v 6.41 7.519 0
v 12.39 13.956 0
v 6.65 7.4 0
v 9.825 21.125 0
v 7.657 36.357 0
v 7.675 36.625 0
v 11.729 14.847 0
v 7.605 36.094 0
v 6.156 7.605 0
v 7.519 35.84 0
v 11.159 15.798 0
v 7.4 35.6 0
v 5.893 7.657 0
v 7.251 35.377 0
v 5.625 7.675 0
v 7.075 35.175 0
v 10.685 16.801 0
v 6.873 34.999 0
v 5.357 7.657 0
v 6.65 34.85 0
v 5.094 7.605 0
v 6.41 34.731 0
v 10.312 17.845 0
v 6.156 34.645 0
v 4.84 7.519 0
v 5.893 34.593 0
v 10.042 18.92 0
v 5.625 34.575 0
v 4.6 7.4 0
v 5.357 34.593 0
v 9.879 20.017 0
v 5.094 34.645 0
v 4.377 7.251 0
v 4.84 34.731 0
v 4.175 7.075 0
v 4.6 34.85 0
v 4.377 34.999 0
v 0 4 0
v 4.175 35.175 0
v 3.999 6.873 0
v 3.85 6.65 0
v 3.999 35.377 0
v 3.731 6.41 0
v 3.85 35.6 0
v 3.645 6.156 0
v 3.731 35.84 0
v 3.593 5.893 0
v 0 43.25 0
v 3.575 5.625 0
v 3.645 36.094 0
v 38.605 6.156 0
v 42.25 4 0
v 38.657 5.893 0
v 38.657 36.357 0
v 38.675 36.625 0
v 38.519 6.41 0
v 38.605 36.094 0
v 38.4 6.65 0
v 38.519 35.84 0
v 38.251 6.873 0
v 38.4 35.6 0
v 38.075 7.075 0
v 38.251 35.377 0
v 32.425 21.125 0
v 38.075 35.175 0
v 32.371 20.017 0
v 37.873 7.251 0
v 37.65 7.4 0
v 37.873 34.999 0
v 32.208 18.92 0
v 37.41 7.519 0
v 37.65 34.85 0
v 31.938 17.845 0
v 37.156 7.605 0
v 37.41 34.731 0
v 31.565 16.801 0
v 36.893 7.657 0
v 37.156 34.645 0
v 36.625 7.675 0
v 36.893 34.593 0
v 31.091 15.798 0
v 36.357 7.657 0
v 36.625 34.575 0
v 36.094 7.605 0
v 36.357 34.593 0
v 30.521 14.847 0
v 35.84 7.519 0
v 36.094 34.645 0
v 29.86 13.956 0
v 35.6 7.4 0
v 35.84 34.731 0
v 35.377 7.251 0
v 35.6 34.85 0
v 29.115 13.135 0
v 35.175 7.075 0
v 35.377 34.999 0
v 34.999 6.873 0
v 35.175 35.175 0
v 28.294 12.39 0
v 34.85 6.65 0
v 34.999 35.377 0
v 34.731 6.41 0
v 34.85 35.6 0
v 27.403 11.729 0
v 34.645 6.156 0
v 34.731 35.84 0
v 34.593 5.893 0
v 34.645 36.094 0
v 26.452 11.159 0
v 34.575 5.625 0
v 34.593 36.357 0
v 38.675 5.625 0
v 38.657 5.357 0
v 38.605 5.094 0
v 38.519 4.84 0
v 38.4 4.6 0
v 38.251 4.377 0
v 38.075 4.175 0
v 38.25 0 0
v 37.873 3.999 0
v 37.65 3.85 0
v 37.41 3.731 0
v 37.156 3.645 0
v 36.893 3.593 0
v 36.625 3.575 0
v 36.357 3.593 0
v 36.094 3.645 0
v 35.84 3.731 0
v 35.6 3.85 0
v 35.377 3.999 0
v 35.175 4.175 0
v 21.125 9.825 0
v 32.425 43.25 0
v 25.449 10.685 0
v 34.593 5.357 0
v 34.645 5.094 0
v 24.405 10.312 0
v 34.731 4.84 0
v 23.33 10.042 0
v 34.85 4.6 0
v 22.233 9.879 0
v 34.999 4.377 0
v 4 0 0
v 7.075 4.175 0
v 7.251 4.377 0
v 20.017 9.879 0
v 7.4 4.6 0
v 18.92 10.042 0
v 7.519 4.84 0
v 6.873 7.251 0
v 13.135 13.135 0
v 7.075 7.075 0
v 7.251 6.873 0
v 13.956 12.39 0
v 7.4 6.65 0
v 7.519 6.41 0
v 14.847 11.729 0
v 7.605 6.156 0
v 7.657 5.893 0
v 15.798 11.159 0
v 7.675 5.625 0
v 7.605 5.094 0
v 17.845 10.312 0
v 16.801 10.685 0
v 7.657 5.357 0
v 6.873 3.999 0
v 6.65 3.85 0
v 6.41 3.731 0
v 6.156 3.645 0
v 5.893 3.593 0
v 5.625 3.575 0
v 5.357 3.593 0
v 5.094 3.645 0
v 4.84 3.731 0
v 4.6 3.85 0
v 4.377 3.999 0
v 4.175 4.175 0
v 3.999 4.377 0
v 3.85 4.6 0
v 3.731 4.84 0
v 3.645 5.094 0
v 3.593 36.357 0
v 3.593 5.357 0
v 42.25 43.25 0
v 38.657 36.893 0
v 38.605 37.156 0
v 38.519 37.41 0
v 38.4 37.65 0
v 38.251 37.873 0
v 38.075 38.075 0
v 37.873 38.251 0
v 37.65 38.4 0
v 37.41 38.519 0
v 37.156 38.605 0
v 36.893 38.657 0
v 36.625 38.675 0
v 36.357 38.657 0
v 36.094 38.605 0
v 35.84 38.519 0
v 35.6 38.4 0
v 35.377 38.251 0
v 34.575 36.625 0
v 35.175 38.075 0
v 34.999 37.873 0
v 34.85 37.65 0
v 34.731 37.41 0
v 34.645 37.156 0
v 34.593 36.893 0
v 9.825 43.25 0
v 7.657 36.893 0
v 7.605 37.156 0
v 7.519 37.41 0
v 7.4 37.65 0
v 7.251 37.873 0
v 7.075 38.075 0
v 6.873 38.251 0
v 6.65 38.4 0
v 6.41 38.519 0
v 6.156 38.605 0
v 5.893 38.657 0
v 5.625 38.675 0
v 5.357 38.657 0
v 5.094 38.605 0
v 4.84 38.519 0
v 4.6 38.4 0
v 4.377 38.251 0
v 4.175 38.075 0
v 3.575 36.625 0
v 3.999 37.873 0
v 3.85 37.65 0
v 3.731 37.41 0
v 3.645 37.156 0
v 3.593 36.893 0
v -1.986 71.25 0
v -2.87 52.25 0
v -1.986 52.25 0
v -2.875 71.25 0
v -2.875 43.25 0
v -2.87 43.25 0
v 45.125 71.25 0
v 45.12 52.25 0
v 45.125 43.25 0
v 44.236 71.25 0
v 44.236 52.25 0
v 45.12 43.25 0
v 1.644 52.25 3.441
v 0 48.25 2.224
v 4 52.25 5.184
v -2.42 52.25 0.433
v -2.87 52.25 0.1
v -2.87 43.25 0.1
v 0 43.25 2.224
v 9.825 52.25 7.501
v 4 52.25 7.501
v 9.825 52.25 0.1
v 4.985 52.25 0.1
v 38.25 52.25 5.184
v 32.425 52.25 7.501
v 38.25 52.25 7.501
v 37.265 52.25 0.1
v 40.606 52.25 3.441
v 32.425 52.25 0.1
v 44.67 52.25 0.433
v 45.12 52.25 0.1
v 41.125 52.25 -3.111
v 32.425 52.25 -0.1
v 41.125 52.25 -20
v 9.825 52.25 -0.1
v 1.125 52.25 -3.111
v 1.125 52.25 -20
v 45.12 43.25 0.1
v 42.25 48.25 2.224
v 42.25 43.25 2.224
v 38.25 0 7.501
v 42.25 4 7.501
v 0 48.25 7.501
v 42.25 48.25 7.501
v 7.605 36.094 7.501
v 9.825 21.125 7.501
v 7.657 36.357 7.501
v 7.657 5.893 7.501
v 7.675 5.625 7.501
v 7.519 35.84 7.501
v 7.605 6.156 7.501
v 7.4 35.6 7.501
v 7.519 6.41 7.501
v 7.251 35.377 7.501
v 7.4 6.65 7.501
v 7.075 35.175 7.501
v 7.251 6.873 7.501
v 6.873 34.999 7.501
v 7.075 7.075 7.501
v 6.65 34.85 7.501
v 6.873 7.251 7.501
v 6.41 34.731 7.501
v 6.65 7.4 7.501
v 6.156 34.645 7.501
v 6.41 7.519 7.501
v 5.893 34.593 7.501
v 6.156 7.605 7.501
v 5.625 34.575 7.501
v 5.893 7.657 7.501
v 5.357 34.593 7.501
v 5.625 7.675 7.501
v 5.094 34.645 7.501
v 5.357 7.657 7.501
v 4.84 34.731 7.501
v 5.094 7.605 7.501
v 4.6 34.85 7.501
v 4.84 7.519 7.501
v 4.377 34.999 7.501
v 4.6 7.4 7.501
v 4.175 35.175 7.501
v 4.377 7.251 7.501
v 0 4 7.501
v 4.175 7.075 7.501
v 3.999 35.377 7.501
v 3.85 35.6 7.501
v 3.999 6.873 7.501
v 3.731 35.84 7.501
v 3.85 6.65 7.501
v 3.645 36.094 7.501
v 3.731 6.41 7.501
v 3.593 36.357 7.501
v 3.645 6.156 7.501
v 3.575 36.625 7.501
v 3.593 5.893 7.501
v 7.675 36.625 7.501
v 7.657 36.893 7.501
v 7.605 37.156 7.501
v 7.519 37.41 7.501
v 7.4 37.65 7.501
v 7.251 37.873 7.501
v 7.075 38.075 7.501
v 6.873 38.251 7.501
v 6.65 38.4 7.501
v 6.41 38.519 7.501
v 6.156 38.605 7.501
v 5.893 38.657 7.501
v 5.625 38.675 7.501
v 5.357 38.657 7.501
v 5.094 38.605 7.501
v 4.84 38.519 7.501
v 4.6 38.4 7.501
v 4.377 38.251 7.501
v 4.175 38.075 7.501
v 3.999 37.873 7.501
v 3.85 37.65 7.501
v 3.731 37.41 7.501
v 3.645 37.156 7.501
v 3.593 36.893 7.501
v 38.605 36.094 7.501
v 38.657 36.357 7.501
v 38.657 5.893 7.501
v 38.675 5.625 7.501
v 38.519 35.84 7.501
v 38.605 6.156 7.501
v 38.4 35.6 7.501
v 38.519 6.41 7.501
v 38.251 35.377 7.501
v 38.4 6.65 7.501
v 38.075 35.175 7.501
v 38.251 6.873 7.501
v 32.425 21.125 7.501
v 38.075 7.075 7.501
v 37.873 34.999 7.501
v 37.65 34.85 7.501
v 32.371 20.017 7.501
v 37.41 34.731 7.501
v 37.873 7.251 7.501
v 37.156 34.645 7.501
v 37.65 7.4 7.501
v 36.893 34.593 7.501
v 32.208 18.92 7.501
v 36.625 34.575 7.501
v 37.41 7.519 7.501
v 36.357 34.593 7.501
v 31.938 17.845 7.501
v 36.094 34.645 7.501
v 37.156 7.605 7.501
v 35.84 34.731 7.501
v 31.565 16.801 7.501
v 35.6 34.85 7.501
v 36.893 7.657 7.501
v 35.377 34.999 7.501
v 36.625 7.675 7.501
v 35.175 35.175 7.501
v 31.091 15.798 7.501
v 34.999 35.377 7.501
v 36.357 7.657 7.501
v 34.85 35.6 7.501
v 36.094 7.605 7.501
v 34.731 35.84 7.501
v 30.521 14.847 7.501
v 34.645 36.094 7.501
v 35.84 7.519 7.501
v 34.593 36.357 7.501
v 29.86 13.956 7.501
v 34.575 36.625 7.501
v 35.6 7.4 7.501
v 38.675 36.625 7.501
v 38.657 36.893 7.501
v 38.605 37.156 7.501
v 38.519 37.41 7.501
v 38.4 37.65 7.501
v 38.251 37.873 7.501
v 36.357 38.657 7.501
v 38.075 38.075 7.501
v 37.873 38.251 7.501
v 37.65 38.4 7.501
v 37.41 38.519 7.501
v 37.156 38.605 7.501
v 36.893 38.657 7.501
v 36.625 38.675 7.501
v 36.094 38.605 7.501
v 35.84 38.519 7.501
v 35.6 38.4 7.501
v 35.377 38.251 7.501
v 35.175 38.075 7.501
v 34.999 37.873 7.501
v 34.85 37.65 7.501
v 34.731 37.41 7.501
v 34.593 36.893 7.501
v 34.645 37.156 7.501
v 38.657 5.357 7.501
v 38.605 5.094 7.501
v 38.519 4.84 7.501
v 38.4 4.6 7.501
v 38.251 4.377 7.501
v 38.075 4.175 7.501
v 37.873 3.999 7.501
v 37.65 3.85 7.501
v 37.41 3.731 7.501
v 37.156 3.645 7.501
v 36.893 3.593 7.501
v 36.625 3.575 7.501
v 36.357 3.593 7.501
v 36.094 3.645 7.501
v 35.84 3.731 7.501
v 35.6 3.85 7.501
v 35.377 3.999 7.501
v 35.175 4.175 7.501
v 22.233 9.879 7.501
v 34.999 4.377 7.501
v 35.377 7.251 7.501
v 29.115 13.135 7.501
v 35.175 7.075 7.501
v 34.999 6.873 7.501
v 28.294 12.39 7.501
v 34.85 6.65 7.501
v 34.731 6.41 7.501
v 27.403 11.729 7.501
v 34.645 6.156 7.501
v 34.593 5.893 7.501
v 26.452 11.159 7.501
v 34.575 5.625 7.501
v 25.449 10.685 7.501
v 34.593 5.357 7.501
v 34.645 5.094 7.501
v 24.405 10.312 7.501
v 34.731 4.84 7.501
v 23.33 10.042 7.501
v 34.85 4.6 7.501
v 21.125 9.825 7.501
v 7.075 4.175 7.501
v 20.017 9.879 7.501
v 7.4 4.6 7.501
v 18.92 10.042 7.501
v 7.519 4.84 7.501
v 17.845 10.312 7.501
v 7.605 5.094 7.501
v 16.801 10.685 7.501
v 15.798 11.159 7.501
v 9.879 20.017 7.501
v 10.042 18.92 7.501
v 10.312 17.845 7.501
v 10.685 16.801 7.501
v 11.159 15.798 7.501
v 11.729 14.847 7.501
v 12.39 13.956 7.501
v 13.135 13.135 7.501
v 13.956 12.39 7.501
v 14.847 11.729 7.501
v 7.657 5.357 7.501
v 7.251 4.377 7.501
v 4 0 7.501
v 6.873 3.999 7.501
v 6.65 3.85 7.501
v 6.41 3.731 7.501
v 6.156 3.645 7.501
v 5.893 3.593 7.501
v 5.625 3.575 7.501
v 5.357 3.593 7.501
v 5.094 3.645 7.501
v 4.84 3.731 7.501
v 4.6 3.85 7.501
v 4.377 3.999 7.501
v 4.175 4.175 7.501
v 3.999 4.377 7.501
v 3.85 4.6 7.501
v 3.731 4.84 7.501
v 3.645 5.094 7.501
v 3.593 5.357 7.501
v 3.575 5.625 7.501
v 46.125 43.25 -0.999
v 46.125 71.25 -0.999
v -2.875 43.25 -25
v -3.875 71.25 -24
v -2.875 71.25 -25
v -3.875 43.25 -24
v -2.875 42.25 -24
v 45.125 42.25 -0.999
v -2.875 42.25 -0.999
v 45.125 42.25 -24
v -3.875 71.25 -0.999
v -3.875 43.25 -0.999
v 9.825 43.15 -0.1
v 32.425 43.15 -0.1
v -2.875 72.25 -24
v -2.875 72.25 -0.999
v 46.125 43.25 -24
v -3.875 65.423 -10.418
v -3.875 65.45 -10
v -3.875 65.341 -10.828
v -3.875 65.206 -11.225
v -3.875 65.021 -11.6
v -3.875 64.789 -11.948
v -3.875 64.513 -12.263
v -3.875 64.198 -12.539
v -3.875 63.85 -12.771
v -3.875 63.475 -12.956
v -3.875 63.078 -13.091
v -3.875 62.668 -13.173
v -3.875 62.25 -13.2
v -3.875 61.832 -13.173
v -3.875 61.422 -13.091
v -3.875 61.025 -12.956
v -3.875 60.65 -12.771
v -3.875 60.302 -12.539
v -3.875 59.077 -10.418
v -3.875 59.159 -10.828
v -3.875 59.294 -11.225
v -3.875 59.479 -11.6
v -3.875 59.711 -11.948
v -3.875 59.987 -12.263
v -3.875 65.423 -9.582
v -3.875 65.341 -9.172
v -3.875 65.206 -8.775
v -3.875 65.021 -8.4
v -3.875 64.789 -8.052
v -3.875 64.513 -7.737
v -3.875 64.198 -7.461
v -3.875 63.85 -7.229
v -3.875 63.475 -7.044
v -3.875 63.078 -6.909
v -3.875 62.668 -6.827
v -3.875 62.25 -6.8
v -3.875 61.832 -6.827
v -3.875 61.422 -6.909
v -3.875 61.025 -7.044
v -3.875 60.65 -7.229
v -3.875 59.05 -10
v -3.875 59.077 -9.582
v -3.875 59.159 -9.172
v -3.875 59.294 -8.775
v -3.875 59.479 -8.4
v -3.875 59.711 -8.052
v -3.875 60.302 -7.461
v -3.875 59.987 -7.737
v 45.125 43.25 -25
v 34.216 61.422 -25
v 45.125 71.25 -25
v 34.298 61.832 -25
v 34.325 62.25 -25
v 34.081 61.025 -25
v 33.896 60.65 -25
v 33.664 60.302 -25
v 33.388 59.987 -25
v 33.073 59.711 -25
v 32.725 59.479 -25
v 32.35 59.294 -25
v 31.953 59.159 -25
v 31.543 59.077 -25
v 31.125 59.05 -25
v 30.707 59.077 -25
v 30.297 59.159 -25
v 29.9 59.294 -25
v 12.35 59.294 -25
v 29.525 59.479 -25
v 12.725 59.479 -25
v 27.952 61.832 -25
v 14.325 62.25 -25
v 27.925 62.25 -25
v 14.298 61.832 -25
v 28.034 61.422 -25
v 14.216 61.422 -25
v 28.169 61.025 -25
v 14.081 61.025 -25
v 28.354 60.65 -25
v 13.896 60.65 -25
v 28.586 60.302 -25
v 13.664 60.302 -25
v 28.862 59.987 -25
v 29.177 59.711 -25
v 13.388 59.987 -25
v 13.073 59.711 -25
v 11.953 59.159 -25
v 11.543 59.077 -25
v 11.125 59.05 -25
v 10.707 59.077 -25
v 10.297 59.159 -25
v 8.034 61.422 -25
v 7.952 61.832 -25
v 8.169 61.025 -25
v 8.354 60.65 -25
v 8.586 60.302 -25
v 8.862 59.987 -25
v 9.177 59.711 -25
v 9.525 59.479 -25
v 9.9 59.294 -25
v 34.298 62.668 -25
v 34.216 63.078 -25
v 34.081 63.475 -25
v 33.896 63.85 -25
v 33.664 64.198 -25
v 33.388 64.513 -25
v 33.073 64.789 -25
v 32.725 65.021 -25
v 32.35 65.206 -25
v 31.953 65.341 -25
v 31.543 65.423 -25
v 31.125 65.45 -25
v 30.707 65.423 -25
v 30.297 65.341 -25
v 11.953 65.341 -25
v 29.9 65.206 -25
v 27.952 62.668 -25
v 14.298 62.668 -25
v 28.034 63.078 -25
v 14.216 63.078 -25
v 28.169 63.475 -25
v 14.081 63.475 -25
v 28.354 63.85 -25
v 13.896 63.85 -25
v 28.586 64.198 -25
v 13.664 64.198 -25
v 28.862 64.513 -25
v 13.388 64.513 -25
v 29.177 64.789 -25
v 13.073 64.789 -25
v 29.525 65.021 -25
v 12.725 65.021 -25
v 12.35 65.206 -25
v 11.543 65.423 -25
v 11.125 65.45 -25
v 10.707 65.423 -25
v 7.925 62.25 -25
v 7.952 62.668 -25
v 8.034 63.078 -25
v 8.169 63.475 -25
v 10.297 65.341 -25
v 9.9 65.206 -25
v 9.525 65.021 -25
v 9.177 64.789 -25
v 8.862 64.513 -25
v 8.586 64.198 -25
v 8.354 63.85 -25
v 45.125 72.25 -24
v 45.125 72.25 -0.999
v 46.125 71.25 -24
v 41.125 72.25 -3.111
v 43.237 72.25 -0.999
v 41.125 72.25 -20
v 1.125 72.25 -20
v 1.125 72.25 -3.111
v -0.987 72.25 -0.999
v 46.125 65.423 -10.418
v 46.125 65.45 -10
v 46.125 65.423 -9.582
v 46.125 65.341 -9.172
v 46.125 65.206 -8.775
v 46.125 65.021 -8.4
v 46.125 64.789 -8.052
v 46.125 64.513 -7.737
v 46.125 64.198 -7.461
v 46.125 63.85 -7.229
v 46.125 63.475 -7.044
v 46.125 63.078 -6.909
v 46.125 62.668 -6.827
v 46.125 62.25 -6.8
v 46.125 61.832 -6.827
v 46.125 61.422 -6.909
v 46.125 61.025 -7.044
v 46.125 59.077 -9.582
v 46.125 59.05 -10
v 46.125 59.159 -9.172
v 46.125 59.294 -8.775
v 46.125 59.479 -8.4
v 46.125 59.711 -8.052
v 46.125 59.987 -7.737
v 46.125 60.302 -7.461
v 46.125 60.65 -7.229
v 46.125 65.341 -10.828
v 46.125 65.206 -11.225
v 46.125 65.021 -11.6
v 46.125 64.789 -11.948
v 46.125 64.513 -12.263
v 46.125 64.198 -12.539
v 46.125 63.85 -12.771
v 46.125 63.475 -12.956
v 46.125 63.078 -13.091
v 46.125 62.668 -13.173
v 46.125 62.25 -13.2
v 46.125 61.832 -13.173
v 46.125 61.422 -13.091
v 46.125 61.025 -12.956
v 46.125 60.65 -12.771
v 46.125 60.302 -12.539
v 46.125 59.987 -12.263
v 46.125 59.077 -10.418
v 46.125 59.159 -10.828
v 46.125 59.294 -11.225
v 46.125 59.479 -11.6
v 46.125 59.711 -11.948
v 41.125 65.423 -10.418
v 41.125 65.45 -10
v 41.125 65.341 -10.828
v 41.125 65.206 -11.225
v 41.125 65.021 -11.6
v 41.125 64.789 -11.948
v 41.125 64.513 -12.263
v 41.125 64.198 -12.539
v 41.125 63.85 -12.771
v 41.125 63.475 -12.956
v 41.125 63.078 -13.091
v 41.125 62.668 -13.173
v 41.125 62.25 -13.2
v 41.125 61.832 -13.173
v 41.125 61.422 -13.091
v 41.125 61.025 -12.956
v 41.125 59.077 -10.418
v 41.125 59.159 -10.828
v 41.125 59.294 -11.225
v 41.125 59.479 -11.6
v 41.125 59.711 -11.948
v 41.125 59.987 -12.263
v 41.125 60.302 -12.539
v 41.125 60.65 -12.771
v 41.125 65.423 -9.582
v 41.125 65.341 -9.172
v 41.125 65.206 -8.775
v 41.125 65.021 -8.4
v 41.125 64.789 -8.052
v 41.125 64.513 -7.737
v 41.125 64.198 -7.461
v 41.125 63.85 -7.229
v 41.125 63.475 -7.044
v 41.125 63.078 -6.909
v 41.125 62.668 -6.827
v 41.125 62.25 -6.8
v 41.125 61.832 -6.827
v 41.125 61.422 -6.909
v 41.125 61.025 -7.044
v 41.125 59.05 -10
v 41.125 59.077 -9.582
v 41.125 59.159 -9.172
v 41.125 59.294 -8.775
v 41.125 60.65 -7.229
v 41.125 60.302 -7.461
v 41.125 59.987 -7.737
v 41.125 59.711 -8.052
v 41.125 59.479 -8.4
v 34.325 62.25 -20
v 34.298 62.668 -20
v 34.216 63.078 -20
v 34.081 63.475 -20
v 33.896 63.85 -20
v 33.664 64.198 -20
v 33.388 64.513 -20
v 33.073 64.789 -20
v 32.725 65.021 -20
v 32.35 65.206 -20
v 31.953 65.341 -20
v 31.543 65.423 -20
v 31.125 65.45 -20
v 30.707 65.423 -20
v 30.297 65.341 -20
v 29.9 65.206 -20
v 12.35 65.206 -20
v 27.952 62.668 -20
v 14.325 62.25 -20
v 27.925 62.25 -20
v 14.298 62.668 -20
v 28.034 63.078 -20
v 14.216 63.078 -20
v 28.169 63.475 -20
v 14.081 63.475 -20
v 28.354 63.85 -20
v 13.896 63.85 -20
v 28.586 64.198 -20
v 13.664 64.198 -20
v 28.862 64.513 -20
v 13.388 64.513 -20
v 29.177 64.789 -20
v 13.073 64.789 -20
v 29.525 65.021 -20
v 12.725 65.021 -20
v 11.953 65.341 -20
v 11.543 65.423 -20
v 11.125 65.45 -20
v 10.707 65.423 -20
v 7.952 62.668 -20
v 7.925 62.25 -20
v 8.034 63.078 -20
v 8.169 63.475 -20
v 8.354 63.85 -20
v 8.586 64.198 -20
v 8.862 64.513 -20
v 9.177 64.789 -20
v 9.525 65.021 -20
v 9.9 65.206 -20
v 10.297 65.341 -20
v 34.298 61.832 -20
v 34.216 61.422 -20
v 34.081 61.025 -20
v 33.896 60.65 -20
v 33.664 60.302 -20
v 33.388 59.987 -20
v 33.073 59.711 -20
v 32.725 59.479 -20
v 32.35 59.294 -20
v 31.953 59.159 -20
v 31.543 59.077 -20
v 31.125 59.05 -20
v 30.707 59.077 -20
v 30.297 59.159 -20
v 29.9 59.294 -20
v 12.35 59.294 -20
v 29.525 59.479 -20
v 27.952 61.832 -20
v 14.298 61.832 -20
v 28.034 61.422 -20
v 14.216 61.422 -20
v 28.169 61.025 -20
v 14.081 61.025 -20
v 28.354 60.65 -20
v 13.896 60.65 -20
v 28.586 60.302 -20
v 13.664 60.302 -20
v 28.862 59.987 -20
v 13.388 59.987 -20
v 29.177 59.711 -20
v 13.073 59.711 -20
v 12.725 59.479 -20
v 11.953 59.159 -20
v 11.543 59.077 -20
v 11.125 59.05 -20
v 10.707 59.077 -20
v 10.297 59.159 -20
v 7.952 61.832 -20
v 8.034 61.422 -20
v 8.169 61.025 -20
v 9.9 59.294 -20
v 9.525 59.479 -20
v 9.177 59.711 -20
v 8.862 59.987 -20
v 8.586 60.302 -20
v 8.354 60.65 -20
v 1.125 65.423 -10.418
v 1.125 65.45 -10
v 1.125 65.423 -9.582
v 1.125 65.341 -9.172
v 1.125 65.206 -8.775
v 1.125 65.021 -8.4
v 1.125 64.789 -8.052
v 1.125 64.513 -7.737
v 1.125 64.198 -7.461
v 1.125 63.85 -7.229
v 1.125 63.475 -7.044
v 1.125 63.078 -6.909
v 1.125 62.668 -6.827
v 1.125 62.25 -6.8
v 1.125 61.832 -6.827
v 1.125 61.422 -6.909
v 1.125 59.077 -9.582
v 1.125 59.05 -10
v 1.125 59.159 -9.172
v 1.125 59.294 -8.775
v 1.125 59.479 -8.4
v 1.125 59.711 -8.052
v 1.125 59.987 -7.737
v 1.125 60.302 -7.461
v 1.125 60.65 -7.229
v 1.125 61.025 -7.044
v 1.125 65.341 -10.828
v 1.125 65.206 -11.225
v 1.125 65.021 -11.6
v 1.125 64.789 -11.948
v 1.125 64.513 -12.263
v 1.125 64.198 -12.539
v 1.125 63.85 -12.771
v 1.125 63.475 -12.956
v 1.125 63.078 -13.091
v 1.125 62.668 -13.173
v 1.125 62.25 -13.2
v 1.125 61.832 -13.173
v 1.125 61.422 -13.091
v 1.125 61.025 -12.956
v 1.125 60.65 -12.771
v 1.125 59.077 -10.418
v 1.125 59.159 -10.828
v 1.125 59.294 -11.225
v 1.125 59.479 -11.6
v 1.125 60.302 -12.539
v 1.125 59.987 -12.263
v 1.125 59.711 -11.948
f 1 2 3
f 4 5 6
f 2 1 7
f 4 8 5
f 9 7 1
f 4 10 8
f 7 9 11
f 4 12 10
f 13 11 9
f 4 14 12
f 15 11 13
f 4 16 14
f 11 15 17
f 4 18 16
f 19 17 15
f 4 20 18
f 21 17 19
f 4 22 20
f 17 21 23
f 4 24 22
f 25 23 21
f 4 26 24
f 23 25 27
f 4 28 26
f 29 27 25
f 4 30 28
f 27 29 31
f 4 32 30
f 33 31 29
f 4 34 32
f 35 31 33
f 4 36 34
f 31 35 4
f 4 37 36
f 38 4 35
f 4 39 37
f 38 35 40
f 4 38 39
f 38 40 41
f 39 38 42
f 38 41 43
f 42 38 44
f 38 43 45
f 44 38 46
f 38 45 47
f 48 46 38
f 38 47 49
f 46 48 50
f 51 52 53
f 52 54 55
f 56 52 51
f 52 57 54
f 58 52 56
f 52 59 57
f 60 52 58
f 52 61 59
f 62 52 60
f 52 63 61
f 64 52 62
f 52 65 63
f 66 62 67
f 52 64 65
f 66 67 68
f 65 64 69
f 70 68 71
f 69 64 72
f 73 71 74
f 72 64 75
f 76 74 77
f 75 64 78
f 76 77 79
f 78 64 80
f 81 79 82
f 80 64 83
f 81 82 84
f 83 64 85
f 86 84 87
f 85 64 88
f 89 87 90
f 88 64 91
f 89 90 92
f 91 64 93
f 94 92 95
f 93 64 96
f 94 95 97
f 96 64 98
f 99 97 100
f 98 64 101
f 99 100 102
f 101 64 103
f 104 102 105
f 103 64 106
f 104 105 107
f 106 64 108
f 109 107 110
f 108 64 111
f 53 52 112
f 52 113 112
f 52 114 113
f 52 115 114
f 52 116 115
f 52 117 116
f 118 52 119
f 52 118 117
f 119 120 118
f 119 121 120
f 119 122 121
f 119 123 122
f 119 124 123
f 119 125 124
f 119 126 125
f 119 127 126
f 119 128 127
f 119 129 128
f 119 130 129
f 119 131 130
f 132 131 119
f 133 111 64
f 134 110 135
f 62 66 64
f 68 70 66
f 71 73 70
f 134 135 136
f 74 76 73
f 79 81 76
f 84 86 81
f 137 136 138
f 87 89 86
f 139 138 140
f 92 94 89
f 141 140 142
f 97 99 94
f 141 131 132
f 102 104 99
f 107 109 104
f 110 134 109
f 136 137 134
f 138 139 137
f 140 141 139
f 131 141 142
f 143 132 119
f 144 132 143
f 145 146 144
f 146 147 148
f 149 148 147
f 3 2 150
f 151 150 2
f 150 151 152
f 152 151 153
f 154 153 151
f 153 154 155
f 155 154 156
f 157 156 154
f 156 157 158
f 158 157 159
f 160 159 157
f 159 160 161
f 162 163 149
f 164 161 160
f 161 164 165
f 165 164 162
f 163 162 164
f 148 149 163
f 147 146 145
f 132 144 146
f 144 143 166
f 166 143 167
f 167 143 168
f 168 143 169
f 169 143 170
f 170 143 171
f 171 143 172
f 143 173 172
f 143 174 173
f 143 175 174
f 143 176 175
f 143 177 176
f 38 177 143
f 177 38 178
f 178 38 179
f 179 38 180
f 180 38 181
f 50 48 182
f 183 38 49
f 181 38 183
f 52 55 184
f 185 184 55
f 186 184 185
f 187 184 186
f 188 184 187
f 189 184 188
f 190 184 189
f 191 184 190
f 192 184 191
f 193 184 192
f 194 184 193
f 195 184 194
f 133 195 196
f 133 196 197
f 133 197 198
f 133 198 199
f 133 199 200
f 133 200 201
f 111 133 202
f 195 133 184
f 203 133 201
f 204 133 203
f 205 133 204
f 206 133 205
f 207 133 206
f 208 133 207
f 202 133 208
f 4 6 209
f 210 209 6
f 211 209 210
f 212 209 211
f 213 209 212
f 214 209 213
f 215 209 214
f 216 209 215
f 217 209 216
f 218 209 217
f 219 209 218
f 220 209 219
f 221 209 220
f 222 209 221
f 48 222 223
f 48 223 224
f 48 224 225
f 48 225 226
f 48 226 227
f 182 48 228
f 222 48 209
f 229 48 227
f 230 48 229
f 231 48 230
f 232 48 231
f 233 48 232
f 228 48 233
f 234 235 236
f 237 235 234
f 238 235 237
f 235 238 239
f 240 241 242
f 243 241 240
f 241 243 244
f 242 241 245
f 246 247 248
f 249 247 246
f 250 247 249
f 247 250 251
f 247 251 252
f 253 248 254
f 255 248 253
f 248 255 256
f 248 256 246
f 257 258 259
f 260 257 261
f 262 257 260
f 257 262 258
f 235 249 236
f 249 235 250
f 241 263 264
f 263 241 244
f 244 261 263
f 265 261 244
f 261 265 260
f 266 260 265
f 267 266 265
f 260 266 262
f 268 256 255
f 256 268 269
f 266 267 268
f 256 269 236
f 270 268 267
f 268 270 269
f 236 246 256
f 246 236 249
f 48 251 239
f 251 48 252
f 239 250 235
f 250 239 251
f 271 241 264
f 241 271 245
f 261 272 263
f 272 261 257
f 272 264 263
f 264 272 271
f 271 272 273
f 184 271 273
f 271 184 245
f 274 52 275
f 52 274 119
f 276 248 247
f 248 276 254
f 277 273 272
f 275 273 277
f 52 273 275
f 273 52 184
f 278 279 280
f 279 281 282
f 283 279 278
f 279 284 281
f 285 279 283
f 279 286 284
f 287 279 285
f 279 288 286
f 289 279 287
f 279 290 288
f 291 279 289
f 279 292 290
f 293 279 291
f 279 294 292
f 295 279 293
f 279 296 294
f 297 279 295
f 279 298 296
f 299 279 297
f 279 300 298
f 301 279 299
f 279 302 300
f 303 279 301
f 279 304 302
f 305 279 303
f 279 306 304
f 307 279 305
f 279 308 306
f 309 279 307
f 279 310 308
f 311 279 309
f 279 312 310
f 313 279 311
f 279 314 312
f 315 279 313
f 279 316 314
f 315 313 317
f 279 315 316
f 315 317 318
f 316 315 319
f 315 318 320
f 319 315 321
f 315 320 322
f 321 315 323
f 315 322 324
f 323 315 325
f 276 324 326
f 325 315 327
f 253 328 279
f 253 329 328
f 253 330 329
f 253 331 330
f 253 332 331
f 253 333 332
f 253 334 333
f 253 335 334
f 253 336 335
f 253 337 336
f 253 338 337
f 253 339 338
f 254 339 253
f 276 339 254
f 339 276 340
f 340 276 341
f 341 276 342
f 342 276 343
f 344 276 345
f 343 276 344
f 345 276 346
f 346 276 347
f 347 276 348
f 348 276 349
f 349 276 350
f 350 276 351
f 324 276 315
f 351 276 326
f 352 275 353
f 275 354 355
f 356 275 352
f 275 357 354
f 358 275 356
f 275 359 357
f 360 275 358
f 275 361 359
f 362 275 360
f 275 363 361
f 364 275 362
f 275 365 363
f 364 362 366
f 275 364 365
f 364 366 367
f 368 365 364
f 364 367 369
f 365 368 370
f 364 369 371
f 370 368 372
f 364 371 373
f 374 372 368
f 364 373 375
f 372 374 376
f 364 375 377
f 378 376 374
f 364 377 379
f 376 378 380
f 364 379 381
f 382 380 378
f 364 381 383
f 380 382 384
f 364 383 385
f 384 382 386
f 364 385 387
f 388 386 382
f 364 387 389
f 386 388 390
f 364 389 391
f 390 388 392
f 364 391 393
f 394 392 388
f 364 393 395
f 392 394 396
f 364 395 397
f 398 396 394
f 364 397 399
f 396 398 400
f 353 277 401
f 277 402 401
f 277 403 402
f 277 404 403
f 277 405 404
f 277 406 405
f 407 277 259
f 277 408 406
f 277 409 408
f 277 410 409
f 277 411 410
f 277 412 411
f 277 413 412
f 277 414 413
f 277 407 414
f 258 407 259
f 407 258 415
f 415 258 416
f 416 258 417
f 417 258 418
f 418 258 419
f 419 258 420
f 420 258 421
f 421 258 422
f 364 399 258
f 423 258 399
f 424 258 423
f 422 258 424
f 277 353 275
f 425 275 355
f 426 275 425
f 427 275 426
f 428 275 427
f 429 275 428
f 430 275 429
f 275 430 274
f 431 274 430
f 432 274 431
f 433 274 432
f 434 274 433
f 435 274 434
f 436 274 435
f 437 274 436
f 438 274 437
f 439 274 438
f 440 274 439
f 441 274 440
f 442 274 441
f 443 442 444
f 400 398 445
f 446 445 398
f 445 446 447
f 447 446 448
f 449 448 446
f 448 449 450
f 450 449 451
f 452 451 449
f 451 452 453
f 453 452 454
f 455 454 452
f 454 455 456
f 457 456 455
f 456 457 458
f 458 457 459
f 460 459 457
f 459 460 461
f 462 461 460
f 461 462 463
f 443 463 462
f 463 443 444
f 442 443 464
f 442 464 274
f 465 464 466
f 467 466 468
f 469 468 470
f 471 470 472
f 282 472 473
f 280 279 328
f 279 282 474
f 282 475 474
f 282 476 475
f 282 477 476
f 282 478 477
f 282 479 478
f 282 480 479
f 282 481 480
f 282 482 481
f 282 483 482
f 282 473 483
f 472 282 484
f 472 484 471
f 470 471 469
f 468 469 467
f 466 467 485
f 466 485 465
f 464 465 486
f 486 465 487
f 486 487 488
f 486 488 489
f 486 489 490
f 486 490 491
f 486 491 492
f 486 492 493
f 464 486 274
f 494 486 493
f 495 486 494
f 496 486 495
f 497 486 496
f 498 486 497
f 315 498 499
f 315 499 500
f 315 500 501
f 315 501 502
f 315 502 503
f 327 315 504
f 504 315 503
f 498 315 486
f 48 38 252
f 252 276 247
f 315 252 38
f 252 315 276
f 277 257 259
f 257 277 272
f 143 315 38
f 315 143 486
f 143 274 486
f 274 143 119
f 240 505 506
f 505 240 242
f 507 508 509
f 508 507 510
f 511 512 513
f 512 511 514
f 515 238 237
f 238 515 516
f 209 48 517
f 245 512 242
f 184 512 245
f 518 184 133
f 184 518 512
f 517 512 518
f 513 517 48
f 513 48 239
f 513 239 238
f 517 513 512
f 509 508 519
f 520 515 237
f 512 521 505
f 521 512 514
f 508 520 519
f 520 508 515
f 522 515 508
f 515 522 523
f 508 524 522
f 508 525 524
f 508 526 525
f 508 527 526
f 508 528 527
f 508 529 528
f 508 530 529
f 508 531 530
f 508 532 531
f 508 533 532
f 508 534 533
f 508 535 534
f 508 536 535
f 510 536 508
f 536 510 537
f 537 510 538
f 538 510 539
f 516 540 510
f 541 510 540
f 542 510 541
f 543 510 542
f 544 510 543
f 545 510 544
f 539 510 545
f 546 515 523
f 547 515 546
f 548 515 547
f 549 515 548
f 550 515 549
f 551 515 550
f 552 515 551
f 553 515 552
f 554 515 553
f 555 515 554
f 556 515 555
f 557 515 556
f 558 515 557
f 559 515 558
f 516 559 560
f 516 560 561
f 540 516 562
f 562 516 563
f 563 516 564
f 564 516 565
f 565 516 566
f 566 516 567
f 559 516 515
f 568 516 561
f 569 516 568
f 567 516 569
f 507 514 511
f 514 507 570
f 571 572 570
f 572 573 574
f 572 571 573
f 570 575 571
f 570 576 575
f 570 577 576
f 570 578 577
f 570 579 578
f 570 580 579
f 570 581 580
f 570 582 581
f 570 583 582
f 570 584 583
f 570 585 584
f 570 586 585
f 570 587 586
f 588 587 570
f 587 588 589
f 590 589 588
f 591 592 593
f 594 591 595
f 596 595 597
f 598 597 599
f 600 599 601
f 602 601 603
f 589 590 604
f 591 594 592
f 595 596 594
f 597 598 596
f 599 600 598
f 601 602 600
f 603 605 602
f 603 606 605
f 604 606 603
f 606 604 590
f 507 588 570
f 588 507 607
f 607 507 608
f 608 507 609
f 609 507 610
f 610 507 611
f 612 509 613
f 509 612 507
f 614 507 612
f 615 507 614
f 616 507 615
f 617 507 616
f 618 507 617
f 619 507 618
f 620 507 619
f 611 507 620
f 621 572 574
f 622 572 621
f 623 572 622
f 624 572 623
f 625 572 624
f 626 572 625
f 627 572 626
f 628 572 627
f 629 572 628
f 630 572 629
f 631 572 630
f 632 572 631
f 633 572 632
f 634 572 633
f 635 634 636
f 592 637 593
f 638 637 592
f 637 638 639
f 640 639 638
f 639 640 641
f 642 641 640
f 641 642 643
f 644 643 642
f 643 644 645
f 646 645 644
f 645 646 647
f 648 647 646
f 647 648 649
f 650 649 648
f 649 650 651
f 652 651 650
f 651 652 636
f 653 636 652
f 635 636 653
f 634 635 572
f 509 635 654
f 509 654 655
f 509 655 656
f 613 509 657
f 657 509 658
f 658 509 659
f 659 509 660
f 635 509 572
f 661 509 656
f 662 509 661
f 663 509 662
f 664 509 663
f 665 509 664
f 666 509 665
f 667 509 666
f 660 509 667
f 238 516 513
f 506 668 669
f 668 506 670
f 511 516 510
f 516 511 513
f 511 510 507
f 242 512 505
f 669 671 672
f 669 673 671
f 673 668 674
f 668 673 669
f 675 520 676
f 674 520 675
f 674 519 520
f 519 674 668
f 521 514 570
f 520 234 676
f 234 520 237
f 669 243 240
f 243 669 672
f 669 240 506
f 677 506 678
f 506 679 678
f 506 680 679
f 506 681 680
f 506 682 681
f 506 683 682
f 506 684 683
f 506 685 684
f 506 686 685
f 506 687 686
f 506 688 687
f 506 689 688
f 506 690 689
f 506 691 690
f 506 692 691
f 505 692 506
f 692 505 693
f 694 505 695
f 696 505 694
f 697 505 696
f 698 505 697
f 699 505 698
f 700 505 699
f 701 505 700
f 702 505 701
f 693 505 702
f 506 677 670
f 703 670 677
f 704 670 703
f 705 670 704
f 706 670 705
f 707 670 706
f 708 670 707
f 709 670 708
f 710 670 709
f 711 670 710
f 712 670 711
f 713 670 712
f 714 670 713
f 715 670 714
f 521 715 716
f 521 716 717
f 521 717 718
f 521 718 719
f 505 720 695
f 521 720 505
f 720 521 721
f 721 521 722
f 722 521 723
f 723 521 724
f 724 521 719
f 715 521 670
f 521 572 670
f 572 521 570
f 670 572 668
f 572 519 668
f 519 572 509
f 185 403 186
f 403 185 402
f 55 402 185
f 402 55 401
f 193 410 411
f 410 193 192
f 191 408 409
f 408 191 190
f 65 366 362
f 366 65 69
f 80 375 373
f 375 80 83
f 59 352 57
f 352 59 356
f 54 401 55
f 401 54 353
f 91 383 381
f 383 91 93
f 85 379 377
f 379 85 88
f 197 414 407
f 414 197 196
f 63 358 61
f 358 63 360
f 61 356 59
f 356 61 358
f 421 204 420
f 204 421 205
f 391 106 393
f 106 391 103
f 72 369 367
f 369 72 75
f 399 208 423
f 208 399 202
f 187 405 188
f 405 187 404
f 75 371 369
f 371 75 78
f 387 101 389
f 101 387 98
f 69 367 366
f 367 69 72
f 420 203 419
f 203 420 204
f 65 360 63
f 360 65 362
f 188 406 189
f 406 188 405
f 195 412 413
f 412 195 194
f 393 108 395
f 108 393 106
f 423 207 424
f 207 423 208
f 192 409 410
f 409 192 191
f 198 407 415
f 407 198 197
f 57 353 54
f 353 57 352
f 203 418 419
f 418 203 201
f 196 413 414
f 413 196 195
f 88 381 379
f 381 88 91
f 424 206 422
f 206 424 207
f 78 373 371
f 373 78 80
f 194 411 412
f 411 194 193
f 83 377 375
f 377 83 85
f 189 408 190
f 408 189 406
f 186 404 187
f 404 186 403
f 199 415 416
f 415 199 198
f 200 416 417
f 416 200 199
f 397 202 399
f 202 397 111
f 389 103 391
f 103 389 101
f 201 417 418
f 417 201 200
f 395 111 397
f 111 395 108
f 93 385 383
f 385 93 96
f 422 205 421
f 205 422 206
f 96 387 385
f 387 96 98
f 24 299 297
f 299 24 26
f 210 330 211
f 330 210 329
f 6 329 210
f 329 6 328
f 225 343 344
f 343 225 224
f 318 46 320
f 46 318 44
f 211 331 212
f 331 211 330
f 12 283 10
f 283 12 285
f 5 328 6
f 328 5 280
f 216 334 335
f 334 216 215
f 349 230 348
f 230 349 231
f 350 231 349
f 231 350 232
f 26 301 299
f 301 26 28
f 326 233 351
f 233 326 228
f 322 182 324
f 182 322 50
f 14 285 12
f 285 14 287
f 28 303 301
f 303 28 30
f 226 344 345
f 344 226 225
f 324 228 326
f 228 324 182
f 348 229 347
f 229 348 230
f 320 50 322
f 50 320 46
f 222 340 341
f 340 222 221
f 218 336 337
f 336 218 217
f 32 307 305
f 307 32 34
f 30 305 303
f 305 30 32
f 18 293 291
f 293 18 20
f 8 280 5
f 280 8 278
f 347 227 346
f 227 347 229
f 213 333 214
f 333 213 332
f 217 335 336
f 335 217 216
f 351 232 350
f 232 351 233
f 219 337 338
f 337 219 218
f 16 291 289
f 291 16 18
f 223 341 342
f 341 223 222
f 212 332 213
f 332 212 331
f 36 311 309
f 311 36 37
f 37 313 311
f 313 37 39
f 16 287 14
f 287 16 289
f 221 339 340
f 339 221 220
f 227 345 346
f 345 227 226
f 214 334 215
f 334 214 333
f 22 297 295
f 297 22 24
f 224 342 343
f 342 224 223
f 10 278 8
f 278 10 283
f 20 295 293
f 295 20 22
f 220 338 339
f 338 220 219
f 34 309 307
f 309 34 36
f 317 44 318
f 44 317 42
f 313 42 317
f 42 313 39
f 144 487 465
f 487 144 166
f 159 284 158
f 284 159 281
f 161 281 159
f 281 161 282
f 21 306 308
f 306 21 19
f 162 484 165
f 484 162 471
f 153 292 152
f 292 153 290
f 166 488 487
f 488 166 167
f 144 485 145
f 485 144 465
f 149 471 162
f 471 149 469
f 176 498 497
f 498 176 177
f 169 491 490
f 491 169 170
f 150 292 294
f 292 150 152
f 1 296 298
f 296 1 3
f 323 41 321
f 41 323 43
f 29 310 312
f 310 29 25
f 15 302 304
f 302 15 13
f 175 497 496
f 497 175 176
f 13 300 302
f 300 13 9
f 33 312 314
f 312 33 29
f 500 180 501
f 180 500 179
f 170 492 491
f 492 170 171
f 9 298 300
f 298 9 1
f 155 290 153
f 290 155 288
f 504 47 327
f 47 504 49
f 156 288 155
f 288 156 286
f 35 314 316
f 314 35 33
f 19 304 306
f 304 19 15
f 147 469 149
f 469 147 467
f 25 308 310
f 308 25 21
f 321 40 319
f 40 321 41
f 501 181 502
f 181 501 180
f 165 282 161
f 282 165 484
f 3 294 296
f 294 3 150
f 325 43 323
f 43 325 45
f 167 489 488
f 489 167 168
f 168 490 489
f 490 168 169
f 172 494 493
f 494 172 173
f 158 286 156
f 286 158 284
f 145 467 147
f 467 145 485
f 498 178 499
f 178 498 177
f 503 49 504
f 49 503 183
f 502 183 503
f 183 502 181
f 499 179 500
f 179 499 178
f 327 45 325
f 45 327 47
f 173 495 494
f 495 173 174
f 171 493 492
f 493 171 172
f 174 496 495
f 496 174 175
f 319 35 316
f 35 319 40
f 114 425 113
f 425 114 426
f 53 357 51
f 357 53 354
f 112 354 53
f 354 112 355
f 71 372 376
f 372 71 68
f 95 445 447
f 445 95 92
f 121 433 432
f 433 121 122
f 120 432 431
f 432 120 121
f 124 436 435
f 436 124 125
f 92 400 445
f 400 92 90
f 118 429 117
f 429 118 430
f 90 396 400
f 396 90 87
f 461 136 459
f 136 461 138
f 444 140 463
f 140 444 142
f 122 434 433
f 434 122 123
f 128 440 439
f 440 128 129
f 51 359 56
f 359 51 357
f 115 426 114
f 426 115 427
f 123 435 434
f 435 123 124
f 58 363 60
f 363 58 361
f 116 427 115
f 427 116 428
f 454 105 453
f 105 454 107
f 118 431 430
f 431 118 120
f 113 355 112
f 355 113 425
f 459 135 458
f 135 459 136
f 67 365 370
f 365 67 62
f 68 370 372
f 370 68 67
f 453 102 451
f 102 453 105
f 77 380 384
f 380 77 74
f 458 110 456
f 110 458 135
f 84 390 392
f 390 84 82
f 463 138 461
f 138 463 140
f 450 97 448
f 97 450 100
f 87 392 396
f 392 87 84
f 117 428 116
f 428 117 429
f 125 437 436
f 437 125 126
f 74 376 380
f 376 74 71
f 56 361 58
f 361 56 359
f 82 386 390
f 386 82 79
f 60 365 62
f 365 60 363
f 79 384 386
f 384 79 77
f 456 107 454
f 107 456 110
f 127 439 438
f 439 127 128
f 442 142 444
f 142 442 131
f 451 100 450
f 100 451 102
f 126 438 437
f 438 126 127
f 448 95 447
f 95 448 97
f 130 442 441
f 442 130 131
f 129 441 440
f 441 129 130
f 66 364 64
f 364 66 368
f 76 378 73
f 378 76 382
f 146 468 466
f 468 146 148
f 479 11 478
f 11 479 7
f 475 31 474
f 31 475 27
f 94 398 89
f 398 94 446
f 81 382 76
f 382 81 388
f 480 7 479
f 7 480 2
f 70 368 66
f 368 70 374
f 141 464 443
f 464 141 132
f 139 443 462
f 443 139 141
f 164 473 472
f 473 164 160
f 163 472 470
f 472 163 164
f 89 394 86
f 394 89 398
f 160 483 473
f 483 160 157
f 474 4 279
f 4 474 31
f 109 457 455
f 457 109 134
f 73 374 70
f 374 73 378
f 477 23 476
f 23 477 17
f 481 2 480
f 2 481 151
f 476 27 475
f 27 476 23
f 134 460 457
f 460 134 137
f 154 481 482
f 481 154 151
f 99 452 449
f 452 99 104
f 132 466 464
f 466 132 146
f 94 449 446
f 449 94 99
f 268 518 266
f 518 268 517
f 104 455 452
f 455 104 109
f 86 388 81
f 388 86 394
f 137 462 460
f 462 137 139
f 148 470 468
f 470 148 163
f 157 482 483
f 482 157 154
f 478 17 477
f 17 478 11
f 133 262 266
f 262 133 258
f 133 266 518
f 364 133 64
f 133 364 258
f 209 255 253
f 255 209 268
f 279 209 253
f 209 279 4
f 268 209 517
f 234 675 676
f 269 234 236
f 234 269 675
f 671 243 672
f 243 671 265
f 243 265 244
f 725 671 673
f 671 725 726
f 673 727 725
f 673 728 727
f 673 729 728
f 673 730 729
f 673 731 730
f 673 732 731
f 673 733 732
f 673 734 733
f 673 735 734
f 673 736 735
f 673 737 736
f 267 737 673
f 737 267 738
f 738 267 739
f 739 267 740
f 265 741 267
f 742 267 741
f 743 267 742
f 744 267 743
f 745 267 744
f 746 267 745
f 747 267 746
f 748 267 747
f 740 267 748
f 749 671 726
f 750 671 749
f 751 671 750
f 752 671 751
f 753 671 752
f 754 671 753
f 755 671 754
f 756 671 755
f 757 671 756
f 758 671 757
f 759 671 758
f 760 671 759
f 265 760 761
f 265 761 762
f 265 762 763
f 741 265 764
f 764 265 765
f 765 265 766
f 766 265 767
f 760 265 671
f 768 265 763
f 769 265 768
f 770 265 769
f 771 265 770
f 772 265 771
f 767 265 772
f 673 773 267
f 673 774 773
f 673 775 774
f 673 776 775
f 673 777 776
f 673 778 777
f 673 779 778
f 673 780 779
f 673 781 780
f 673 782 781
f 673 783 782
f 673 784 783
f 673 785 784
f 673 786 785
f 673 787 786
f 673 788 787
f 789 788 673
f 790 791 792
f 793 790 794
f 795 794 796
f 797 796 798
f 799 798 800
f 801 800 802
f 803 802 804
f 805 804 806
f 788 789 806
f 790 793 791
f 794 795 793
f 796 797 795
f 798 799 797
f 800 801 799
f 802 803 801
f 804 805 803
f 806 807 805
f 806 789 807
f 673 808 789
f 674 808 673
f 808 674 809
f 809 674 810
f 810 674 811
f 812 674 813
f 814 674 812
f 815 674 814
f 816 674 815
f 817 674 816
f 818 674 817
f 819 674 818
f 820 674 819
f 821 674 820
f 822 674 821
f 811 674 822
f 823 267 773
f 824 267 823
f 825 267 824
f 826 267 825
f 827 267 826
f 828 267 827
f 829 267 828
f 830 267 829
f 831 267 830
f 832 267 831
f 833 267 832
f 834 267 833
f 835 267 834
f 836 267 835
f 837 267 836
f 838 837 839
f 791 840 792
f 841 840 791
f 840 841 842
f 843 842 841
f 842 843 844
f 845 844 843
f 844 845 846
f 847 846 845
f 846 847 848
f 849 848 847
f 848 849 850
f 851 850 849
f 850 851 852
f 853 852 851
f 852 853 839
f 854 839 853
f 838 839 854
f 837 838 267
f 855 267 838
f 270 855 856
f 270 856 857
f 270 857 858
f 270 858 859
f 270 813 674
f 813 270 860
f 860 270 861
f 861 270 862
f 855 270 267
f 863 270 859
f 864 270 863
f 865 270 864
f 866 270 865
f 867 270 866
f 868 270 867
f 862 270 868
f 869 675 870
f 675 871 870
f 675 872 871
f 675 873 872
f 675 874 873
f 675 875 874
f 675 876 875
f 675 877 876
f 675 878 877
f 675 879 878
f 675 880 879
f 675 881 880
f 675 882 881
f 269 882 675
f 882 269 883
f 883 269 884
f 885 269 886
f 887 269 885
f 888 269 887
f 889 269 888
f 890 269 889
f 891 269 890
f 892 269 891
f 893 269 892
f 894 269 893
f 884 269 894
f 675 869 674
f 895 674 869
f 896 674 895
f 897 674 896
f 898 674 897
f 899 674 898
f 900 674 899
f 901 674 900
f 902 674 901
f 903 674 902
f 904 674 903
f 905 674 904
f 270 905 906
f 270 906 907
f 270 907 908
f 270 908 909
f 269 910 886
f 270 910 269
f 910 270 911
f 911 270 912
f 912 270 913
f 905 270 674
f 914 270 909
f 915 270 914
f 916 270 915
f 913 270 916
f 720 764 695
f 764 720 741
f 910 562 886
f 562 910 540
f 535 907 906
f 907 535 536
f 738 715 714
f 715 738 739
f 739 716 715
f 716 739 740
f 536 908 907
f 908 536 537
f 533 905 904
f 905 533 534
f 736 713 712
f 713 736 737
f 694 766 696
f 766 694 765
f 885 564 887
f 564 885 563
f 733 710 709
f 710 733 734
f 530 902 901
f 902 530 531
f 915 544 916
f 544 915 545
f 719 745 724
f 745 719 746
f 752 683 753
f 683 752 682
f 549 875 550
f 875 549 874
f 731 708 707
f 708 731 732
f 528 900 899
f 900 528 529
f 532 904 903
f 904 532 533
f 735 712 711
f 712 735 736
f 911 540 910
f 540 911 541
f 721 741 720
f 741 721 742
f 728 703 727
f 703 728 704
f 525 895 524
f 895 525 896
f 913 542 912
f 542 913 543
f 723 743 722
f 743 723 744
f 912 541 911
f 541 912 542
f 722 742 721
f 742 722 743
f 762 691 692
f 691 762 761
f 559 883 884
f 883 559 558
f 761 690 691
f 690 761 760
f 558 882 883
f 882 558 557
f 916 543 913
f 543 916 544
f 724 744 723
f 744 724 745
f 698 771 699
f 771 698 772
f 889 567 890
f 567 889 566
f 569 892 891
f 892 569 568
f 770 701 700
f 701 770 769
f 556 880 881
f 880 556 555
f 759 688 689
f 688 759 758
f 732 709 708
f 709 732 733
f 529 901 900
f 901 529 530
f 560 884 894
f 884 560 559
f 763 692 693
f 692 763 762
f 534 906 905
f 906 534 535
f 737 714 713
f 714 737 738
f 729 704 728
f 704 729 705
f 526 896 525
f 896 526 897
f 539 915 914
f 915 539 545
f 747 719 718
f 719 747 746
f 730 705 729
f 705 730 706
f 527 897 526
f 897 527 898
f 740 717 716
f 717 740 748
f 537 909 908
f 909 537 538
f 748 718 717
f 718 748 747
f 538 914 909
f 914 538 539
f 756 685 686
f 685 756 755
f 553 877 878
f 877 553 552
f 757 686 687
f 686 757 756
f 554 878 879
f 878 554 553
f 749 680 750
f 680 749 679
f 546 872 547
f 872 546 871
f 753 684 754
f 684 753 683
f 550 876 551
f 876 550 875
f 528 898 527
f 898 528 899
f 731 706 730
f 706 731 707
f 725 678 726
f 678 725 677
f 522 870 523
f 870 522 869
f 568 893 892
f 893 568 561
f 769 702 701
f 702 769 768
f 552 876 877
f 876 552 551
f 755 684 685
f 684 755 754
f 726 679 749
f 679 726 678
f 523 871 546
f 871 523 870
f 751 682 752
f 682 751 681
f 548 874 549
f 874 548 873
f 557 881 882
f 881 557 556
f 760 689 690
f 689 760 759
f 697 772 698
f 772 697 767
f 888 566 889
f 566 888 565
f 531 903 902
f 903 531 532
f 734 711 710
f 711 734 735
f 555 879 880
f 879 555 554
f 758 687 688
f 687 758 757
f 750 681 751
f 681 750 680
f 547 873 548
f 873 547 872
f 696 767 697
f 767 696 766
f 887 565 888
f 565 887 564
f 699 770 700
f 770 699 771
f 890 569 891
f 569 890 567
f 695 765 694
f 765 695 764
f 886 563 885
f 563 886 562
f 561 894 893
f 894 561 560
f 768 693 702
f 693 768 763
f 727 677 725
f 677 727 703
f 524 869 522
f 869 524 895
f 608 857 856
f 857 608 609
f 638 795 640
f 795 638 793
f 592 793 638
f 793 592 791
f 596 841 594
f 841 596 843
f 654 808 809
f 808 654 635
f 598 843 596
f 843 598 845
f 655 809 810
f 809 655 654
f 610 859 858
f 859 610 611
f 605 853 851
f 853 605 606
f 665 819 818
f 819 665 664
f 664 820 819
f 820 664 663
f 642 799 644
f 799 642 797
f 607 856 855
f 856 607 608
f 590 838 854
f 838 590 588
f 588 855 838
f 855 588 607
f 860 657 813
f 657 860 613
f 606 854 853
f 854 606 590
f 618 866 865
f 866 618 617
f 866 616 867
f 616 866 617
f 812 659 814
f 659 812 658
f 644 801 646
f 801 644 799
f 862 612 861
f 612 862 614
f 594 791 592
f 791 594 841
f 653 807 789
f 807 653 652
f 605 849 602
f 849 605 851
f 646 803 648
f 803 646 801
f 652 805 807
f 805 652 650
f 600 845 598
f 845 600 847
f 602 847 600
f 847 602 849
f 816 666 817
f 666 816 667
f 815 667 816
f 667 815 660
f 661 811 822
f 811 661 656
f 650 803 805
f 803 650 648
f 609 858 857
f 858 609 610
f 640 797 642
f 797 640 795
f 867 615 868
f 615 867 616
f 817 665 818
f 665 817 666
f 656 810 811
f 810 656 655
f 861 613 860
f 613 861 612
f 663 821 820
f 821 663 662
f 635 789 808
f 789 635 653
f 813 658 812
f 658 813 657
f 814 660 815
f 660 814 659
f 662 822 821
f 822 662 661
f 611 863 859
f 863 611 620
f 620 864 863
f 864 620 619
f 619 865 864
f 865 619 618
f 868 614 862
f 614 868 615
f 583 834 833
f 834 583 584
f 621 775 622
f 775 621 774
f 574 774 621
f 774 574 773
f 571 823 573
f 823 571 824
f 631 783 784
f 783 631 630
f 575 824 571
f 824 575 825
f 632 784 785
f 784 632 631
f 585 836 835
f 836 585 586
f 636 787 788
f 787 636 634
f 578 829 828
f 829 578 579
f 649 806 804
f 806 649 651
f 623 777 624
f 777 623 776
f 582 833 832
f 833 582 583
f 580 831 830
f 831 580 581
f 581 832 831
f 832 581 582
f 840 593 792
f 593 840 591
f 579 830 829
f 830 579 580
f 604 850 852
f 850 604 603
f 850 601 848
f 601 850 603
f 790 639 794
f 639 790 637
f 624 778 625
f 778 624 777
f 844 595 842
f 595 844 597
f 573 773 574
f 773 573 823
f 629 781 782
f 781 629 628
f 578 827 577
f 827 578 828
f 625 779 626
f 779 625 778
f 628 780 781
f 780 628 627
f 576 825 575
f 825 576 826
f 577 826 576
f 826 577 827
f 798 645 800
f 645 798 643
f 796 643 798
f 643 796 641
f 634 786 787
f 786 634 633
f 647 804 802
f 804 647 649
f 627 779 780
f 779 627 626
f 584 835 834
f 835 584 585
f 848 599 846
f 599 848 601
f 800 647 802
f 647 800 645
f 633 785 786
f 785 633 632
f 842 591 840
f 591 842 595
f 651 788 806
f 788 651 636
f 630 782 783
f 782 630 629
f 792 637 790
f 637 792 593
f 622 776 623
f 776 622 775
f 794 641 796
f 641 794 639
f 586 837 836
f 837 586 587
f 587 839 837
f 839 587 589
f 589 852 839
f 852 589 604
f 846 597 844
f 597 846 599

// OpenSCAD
// file: scad/tapercube.scad
module tapercube(width=10, height=10, depth=10, taper=3.0) {
  plane = 0.001;
  hull() {
    translate([taper/2,taper/2,0])
      cube([width-taper, height-taper, plane]);
    translate([0,0,taper/2]) {
      translate([0,taper/2])
        cube([width, height-taper, plane]);
      translate([taper/2,0])
        cube([width-taper, height, plane]);
    }

    translate([taper/2,taper/2,depth-plane])
      cube([width-taper, height-taper, plane]);
    translate([0,0,depth-taper/2]) {
      translate([0,taper/2])
        cube([width, height-taper, plane]);
      translate([taper/2,0])
        cube([width-taper, height, plane]);
    }
  }
}

module cornerless_cube(width=10, height=10, depth=10, taper=3.0) {
  plane = 0.001;
  hull() {
    translate([0,taper/2])
      cube([width, height-taper, plane]);
    translate([taper/2,0])
      cube([width-taper, height, plane]);

    translate([0,0,depth]) {
      translate([0,taper/2])
        cube([width, height-taper, plane]);
      translate([taper/2,0])
        cube([width-taper, height, plane]);
    }
  }
}
// main file
include <scad/tapercube.scad>;

long=100;
shim=0.1;
fudge = 0.3;

motor_width = 42.25;
motor_mount_ring_r = 11.0 + fudge;
motor_mount_hole_r = 1.75 + fudge;
motor_mount_height = 7.5;
motor_dist_between_mount_holes = 31;

makerslide_h = 20.0;
makerslide_w = 40.0;

makerslide_bracket_sleeve = 20.0;

bracket_thk = 5.0;
bracket_w = 10.0;
bracket_h = makerslide_w + bracket_thk*2;
bracket_d = makerslide_h + bracket_thk;

module motor_mount_holes() {
  d = motor_dist_between_mount_holes;
  r = sqrt(d*d*2)/2;
  for (theta=[45,135,225,315])
    translate([cos(theta)*r, sin(theta)*r])
      cylinder(r=motor_mount_hole_r, h=long, center=true, $fn = 48);
}

module ramp() {
  hull() {
    translate([10, 0, 0])
    cube([shim, bracket_w-1, motor_mount_height]);
    cube([10, bracket_w-1, shim]);
  }
}

difference() {
  union() {
    cornerless_cube(motor_width, motor_width+10.0, motor_mount_height, 8.0);

    translate([0, 1.00, 0]) { // move 1 unit up to accommodate tapercube
      translate([-2.87, motor_width, 0])
        ramp();

      translate([motor_width+2.87, motor_width, 0])
        mirror([1, 0, 0])
          ramp();
    }

    translate([motor_width/2-bracket_h/2, motor_width, -bracket_d])
      tapercube(bracket_h, bracket_w + makerslide_bracket_sleeve, bracket_d, 2.0);
  }
  
  translate([motor_width/2, motor_width/2]) {
    motor_mount_holes();
    translate([0, 0, -shim])
      cylinder(r=motor_mount_ring_r, h=long, $fn = 64);
      translate([-motor_mount_ring_r, 0, -shim])
        cube([motor_mount_ring_r*2, long, long]);
  }

  //makerslide
  translate([motor_width/2-makerslide_w/2, motor_width + bracket_w, -makerslide_h]) {
    cube([makerslide_w, makerslide_bracket_sleeve+shim, makerslide_h+shim]);
    
    translate([-long/3, makerslide_bracket_sleeve/2, makerslide_h/2])
      rotate([0, 90, 0])
        cylinder(r=3.2, h=long, $fn=48);    

    translate([makerslide_w/2-makerslide_w/4, makerslide_bracket_sleeve/2, -long/2])
      cylinder(r=3.2, h=long, $fn=48);    

    translate([makerslide_w/2+makerslide_w/4, makerslide_bracket_sleeve/2, -long/2])
      cylinder(r=3.2, h=long, $fn=48);

    translate([0, 0, makerslide_h]) {
      translate([0, 0, 0])
        rotate([0, 45, 0])
          translate([-5, 0, -2.2])
            cube([10, makerslide_bracket_sleeve+shim, 5]);

      translate([makerslide_w, 0, 0])
        rotate([0, -45, 0])
          translate([-5, 0, -2.2])
            cube([10, makerslide_bracket_sleeve+shim, 5]);
    }
  }
}
